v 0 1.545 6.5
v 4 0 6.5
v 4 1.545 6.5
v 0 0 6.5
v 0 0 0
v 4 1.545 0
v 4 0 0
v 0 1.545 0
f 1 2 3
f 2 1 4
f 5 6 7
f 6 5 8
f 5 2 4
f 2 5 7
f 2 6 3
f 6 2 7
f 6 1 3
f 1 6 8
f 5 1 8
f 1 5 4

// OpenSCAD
// Generated by SolidPython 1.0.4 on 2021-01-27 23:13:17


cube(size = [4, 1.5450000000, 6.5000000000]);
